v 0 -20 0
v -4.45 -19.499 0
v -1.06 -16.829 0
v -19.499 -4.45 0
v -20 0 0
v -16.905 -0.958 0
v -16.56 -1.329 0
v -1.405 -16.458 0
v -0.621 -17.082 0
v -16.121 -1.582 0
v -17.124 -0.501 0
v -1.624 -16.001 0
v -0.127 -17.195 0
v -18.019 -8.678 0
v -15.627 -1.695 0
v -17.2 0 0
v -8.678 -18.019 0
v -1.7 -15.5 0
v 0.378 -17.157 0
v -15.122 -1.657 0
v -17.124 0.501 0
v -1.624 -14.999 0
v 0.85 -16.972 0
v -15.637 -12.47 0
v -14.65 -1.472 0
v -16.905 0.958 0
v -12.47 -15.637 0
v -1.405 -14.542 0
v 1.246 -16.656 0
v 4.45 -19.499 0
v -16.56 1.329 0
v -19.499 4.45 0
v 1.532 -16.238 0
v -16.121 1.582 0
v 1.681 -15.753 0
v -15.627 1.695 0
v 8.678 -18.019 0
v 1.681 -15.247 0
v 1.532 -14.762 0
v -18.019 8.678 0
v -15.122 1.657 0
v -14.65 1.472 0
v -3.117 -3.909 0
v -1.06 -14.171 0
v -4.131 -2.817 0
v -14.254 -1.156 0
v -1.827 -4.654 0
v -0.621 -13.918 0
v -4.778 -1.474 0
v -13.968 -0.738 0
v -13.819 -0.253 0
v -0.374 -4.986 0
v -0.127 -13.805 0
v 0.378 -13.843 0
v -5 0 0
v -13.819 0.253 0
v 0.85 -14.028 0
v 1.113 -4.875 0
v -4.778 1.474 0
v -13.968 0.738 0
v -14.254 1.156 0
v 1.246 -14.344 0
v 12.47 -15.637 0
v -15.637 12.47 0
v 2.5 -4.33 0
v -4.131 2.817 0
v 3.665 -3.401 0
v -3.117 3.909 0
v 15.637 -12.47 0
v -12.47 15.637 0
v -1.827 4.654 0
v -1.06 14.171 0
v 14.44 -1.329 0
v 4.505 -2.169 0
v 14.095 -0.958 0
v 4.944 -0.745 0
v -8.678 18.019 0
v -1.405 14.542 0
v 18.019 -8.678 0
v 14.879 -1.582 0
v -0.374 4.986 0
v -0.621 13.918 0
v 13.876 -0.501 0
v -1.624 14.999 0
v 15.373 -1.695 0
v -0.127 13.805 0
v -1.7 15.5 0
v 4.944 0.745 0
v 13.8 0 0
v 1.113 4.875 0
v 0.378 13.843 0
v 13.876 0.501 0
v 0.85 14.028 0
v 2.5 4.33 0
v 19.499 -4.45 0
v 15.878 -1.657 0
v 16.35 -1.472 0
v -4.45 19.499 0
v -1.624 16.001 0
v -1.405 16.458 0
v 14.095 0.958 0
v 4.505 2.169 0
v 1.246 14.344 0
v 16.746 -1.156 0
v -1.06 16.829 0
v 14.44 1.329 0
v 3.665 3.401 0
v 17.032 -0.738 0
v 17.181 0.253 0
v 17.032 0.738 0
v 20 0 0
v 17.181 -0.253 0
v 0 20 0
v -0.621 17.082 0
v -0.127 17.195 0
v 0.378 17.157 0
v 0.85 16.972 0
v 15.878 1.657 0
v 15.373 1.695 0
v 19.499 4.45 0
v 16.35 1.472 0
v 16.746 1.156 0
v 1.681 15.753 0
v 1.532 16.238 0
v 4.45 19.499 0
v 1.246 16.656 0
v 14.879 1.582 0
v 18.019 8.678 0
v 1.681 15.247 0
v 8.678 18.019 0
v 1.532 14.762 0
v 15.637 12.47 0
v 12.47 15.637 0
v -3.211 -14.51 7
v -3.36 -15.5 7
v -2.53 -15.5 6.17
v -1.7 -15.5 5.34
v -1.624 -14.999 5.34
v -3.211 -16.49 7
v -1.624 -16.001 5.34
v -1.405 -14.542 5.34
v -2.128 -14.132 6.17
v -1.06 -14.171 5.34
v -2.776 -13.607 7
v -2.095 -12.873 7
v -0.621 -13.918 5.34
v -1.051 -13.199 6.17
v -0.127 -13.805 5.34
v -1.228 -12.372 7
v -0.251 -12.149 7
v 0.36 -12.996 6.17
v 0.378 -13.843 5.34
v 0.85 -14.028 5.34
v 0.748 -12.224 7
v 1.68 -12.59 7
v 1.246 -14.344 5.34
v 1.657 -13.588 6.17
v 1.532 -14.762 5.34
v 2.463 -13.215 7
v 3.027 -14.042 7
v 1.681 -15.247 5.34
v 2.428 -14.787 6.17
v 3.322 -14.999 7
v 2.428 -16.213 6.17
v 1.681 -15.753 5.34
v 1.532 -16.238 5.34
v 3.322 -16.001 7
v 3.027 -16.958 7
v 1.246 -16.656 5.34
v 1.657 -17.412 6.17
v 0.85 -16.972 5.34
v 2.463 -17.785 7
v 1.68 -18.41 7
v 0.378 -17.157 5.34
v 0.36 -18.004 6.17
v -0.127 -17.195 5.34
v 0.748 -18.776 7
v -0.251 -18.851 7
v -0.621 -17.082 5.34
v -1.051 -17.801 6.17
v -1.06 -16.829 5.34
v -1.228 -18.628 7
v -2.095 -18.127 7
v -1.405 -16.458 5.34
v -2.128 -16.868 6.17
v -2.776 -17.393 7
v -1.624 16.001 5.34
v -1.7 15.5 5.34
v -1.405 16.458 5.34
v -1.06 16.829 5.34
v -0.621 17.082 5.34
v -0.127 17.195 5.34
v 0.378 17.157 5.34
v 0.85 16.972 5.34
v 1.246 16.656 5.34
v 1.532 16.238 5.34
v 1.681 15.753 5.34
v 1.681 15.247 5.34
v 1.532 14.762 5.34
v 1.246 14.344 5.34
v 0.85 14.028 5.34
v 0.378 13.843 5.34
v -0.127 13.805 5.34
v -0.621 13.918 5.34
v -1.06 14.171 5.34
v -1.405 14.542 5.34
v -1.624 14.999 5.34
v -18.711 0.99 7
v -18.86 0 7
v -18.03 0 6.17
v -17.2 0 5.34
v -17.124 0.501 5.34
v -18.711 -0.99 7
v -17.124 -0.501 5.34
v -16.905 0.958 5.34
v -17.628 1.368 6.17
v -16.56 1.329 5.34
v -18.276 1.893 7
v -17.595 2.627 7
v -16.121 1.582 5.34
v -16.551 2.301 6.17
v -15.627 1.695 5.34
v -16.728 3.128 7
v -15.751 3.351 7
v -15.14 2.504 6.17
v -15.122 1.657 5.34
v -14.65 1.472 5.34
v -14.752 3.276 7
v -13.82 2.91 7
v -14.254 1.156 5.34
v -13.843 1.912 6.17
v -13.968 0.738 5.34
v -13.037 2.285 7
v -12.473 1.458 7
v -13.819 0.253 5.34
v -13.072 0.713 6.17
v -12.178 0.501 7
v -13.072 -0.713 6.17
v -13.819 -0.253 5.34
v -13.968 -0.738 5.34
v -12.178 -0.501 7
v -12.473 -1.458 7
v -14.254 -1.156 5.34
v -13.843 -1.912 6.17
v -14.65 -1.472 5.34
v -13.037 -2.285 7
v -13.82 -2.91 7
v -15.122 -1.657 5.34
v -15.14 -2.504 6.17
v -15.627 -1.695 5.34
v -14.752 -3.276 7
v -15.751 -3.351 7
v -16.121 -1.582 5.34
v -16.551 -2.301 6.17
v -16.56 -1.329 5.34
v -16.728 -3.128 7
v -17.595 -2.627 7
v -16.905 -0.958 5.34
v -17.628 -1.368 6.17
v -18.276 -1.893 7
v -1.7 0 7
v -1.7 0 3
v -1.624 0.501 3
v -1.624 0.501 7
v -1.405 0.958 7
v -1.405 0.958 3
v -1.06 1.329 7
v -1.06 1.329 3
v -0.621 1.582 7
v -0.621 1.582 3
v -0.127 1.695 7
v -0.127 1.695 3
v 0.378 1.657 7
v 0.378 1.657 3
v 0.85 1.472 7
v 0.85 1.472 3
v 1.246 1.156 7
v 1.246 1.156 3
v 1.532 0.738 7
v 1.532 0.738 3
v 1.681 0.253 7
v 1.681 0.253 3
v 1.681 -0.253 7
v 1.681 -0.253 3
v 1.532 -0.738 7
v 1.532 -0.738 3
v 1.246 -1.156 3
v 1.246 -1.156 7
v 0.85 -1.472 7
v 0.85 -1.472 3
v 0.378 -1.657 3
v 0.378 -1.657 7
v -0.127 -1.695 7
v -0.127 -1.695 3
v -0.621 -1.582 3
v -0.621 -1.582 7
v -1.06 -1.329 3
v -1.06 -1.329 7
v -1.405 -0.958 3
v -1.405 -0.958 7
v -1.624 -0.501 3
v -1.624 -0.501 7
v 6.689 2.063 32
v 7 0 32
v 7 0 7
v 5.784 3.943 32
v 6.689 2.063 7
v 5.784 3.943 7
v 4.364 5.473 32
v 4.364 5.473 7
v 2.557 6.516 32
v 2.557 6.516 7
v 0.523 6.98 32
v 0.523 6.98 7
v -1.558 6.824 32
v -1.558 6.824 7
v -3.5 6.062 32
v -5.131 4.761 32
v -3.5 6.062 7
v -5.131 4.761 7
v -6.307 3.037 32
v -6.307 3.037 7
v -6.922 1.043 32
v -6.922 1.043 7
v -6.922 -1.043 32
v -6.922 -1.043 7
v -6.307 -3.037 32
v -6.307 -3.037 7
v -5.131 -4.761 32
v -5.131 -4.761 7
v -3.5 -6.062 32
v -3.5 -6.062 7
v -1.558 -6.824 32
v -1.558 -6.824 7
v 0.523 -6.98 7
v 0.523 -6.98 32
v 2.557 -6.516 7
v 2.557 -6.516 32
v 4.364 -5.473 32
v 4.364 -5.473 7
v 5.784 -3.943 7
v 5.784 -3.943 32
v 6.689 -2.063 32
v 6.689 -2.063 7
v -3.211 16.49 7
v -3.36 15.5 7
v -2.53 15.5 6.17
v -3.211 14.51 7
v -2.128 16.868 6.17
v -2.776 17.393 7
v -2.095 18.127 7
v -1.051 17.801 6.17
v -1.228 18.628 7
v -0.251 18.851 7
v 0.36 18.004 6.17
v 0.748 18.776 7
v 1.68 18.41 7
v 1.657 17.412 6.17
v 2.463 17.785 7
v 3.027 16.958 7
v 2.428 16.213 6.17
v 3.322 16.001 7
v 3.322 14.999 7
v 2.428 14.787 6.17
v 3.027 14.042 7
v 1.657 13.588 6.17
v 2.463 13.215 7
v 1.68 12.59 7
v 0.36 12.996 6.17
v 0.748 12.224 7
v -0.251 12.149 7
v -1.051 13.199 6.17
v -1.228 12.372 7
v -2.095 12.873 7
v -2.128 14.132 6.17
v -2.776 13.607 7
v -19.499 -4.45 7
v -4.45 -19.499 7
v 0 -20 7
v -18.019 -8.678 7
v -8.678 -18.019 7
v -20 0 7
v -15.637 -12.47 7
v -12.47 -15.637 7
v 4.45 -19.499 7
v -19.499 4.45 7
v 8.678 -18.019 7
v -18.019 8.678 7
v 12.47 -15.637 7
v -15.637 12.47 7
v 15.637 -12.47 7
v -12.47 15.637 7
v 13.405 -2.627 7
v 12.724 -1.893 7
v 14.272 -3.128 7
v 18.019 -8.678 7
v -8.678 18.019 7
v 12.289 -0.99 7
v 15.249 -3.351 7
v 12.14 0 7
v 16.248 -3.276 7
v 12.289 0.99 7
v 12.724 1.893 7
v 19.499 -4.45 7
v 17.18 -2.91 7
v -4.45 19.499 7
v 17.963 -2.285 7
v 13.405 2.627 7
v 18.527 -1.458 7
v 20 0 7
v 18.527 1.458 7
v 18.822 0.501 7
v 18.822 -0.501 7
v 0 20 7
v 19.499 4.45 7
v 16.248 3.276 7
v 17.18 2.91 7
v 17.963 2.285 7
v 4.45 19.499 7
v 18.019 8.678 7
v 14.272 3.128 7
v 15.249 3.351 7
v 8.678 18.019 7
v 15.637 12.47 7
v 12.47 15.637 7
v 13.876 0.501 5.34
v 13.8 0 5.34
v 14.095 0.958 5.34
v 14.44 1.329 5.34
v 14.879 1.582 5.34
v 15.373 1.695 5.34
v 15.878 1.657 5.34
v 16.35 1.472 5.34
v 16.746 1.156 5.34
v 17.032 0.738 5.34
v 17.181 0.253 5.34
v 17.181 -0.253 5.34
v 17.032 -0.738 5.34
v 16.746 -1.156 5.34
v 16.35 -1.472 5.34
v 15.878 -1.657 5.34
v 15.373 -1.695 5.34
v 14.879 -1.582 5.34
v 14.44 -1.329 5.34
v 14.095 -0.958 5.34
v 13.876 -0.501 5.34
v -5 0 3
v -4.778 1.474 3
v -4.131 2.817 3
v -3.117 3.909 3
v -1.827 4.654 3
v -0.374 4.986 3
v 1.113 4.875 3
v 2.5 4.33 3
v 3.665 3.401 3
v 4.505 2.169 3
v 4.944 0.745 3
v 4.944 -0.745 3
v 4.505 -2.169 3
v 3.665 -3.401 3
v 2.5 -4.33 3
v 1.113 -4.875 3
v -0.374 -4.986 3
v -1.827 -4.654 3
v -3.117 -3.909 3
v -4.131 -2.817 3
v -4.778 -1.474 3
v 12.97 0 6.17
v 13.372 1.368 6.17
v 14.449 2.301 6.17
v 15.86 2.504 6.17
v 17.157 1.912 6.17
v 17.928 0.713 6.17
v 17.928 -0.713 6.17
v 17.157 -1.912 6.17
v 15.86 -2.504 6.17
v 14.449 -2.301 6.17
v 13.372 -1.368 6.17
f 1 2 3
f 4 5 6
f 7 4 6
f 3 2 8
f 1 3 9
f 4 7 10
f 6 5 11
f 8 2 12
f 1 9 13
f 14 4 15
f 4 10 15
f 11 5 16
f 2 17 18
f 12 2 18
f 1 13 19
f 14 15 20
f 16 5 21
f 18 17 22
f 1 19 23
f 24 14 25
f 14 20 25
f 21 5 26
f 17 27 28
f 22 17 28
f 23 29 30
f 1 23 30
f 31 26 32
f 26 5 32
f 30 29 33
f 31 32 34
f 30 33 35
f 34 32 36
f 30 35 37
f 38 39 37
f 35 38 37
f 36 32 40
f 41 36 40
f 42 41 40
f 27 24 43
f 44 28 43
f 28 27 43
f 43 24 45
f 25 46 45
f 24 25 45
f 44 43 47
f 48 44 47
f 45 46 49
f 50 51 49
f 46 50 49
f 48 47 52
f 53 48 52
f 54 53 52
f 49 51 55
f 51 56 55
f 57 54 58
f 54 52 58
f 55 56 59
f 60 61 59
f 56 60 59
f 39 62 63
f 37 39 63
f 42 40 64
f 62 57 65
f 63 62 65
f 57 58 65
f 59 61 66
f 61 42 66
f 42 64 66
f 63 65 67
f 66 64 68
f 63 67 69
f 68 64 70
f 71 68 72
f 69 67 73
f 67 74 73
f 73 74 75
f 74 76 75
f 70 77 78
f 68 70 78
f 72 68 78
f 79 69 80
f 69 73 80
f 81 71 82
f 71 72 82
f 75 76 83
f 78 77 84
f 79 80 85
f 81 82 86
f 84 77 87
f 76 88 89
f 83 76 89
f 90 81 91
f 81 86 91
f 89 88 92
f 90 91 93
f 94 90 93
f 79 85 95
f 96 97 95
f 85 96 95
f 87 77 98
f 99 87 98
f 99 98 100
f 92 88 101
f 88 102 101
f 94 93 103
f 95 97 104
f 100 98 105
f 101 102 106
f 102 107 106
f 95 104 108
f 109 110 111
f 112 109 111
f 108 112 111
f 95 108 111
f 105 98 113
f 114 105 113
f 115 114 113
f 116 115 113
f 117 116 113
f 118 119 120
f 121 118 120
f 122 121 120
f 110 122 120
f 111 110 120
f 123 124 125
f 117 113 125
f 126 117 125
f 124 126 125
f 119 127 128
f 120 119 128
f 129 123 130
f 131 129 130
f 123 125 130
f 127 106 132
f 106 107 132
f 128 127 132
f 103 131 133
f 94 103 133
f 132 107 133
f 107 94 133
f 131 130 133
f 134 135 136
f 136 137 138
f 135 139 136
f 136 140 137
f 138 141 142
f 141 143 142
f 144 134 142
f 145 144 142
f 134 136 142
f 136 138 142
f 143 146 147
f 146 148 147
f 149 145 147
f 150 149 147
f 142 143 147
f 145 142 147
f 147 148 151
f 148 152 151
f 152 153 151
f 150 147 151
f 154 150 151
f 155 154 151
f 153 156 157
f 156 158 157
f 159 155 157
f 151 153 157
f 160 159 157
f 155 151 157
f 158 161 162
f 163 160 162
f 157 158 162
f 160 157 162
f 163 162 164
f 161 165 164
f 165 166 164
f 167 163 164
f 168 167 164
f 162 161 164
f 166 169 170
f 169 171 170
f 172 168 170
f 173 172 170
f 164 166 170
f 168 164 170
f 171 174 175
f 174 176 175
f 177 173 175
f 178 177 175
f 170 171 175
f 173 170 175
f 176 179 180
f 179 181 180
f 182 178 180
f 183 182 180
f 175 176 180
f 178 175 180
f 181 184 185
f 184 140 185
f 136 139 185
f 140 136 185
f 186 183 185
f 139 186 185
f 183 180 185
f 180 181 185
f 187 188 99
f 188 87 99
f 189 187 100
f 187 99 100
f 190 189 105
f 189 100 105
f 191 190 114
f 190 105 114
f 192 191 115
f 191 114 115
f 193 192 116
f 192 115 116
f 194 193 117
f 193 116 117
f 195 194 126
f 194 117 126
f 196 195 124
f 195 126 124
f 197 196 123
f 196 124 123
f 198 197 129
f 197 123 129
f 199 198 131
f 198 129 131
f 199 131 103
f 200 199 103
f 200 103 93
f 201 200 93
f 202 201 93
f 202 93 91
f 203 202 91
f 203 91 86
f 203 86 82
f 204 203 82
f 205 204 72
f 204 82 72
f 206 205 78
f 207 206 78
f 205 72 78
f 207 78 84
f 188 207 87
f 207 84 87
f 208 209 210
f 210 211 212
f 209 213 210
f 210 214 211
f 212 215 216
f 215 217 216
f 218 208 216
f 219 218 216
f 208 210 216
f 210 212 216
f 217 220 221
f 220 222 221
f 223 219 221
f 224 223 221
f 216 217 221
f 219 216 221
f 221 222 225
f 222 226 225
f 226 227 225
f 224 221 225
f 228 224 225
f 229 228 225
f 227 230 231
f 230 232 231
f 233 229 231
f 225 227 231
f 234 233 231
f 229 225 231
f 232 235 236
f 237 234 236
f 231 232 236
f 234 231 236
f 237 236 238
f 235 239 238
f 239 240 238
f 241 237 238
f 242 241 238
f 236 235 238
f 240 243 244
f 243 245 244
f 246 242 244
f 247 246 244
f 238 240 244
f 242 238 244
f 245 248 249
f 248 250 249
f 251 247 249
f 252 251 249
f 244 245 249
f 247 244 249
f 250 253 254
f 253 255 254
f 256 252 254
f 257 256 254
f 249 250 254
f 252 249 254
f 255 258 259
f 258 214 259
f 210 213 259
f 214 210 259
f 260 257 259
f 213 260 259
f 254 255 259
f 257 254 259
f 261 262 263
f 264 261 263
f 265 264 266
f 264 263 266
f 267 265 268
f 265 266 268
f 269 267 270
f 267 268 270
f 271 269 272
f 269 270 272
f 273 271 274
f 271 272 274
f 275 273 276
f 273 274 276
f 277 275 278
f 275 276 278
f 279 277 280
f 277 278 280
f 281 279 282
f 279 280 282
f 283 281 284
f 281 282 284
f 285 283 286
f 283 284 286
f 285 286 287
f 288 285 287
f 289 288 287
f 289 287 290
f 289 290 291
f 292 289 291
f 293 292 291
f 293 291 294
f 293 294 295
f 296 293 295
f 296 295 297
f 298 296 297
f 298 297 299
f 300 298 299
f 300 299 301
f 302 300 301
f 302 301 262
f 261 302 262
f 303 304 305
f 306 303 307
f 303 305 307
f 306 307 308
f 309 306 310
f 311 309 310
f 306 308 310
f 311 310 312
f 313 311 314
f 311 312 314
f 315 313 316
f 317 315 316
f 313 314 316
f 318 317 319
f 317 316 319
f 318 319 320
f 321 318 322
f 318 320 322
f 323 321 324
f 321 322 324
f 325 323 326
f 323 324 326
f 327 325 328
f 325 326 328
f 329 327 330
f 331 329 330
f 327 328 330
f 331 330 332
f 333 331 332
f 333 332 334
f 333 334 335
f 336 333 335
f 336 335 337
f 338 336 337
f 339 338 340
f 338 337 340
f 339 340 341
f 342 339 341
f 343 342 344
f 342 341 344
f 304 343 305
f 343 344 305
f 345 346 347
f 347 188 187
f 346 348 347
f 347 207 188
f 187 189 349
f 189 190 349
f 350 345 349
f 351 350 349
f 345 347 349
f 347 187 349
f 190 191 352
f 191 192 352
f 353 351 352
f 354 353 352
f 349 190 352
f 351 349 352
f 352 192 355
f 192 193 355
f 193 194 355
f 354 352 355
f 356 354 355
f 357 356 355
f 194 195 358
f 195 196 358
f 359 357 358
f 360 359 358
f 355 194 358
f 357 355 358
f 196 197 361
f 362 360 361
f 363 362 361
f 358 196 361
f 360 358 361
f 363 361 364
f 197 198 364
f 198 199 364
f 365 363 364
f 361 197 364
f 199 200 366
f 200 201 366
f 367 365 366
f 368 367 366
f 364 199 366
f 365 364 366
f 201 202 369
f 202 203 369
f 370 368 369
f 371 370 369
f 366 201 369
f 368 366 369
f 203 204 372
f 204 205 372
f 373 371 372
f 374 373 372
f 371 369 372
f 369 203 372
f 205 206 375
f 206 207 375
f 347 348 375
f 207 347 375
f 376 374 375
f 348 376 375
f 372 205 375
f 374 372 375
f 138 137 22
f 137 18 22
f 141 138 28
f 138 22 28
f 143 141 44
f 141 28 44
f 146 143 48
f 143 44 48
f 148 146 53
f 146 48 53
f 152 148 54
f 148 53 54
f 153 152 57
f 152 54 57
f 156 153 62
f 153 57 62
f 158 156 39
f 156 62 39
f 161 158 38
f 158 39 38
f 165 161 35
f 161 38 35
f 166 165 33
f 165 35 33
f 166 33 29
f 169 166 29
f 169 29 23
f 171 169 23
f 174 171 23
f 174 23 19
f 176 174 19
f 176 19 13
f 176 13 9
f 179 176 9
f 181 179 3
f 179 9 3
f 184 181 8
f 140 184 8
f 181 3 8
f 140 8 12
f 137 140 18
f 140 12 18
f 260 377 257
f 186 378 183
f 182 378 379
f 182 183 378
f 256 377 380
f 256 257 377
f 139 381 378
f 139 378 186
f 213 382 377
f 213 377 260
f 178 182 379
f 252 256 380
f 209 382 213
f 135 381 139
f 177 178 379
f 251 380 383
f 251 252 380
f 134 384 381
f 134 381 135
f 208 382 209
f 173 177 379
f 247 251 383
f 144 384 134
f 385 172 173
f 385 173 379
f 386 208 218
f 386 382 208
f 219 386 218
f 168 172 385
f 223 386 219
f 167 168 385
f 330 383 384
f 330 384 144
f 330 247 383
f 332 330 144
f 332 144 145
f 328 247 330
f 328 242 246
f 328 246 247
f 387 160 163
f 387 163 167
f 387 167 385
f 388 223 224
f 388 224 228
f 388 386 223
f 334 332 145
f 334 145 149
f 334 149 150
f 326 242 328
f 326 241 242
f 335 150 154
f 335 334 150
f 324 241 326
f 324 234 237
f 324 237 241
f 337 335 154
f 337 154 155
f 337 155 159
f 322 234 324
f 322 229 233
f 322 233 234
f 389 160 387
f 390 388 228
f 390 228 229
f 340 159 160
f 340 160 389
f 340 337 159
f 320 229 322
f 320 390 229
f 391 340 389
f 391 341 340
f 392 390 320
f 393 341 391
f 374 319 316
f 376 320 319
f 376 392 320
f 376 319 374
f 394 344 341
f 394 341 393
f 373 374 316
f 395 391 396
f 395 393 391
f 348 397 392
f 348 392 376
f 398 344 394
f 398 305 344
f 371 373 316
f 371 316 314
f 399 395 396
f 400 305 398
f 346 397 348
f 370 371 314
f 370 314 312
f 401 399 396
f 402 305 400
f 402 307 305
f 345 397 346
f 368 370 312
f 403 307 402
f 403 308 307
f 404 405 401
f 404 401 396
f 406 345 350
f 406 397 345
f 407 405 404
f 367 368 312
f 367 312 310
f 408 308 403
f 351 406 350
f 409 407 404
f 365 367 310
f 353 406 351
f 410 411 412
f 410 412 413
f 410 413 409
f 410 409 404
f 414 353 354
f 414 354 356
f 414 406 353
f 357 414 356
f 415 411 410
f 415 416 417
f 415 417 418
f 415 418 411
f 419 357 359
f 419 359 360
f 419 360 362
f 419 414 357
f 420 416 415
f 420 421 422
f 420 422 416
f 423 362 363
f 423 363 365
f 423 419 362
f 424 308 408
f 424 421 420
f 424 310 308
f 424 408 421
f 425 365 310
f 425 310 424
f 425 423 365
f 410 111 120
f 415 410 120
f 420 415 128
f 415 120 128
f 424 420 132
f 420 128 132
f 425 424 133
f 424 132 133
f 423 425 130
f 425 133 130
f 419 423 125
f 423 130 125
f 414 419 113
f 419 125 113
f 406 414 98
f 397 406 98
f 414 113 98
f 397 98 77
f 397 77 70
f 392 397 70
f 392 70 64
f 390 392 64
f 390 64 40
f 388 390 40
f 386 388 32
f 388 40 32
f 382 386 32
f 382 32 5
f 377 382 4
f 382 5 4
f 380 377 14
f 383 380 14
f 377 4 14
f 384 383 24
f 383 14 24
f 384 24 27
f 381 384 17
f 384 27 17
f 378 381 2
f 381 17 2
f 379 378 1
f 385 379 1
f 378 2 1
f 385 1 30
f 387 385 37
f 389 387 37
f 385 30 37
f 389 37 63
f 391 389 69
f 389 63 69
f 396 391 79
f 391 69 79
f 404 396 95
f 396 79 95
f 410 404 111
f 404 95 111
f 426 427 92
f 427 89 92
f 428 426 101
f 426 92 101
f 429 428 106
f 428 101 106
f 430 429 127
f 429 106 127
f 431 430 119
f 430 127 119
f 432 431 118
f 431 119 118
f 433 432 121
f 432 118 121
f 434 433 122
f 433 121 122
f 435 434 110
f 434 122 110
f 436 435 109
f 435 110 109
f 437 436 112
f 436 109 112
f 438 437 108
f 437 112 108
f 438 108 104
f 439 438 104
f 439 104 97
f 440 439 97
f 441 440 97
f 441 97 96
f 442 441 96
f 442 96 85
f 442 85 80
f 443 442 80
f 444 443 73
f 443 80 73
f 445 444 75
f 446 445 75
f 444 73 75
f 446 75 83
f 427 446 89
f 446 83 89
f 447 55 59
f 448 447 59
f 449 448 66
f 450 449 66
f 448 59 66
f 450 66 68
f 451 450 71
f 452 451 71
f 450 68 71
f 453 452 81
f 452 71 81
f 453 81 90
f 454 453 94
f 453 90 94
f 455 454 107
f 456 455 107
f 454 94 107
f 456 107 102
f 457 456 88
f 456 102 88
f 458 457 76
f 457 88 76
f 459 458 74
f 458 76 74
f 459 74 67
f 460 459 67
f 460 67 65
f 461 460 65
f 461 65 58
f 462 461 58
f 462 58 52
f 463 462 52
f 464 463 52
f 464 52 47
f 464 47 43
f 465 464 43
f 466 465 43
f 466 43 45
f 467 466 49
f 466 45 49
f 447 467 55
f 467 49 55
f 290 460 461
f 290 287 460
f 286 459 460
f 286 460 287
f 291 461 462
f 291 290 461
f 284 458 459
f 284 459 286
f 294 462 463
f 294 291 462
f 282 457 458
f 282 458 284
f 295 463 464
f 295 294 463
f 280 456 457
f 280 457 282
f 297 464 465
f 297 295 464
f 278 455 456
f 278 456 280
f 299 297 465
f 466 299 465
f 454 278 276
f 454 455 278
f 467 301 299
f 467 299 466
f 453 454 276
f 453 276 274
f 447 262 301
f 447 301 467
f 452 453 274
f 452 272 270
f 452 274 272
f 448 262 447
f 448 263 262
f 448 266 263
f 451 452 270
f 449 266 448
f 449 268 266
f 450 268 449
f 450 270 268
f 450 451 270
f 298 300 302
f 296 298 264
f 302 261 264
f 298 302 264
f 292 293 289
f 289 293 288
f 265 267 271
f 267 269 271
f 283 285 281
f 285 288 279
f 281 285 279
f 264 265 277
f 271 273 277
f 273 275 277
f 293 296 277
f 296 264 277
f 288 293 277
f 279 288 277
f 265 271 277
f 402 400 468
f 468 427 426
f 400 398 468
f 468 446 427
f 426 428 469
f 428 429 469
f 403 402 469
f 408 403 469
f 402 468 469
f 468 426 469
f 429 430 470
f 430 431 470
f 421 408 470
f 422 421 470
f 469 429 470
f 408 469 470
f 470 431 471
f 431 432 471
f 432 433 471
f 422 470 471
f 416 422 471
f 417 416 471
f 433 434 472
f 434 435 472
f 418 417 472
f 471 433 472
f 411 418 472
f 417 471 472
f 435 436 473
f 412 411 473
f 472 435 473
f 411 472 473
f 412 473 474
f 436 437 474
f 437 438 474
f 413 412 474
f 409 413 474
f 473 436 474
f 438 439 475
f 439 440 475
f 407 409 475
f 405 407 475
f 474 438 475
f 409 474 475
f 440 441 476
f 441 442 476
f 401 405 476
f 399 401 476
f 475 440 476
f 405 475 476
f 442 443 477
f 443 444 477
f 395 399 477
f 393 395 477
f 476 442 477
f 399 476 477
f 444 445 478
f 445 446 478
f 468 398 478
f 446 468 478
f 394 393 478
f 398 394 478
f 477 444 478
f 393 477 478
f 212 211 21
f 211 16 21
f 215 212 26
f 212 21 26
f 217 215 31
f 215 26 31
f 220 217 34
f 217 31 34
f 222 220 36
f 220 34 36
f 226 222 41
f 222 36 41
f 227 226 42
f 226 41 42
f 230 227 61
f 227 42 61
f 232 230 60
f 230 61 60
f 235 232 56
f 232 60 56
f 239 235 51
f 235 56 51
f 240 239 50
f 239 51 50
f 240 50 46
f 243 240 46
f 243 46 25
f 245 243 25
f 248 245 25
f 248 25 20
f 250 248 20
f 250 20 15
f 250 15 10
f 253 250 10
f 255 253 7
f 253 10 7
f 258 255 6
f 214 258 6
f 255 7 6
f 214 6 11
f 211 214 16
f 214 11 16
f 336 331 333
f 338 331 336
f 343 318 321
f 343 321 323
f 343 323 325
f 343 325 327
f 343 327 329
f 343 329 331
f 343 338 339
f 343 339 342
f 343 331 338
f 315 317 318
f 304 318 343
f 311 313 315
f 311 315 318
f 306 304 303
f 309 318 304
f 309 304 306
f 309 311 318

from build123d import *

# Parameters (mm, degrees)
CROQUIS1_R                                           = 20
SALIENTE_EXTRUIR1_DEPTH                              = 7
REFRENTADO_PARA_TORNILLO_TAP_N_CON_CABEZ_D           = 3.4
REFRENTADO_PARA_TORNILLO_TAP_N_CON_CABEZ_CSINK_D     = 6.72
REFRENTADO_PARA_TORNILLO_TAP_N_CON_CABEZ_CSINK_ANGLE = 90
TALADRO_DE_MARGEN_PARA_M31_D                         = 3.4
CROQUIS8_R                                           = 5
CORTAR_EXTRUIR1_DEPTH                                = 3
CROQUIS9_R                                           = 7
SALIENTE_EXTRUIR2_DEPTH                              = 25


with BuildPart() as part:
    # Croquis1 → Saliente-Extruir1 (new body)
    with BuildSketch(Plane.XY):
        Circle(CROQUIS1_R)
    extrude(amount=SALIENTE_EXTRUIR1_DEPTH)

    # Refrentado para tornillo tapón con cabeza plana de clavija de M31 (through all)
    with Locations(Plane.XY.offset(7)):
        with Locations((0, 15.5), (15.5, 0), (0, -15.5), (-15.5, 0)):
            CounterSinkHole(REFRENTADO_PARA_TORNILLO_TAP_N_CON_CABEZ_D / 2, REFRENTADO_PARA_TORNILLO_TAP_N_CON_CABEZ_CSINK_D / 2, counter_sink_angle=REFRENTADO_PARA_TORNILLO_TAP_N_CON_CABEZ_CSINK_ANGLE)

    # Taladro de margen para M31 (through all)
    with Locations(Plane.XY.offset(7)):
        with Locations((0, 0)):
            Hole(TALADRO_DE_MARGEN_PARA_M31_D / 2)

    # Croquis8 → Cortar-Extruir1 (cut)
    with BuildSketch(Plane(origin=(0, 0, 0), x_dir=(-1, 0, 0), z_dir=(0, 0, -1))):
        Circle(CROQUIS8_R)
    extrude(amount=-CORTAR_EXTRUIR1_DEPTH, mode=Mode.SUBTRACT)

    # Croquis9 → Saliente-Extruir2 (add)
    with BuildSketch(Plane.XY.offset(7)):
        Circle(CROQUIS9_R)
    extrude(amount=SALIENTE_EXTRUIR2_DEPTH)


solid = part.part
